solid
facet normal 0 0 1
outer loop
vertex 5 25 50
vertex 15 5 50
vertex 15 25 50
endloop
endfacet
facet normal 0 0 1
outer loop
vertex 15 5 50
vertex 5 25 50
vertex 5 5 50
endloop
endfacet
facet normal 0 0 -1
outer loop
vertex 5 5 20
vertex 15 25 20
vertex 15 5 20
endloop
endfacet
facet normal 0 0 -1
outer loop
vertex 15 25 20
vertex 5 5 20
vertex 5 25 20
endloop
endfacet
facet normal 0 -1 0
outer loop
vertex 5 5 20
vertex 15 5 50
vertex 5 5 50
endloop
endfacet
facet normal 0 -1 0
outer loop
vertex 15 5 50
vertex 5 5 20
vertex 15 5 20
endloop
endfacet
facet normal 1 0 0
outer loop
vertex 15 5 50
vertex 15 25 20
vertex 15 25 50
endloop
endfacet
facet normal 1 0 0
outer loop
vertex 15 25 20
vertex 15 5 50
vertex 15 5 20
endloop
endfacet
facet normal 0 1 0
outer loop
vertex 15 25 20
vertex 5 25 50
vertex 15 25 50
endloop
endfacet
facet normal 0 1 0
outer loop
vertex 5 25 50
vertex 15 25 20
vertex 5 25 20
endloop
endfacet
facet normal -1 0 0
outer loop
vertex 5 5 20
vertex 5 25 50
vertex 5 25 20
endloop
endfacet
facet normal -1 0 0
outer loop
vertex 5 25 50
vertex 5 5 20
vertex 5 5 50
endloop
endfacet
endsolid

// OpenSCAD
result = undef;
$lcs = [0,0,0];

function getLCS() = $lcs;
module item() {
	result = $lcs;
	echo(str("LCS_known: ", result));
	cube([10,20,30]);
}

module translate_ok(v) {
	$lcs = $lcs + v;
	//echo(parent_module());
	echo(str("TRANSLATE: ", v));
	echo(str("LCS: ", $lcs));
	translate(v) children();
}
echo(str("LCS_before: ", $lcs));
translate_ok([10,0,0])
translate_ok([0,10,0])
translate_ok([0,0,10])
translate_ok([-5,-5,10])
item();

echo(str("LCS_after: ", result));

a=1;
$b=4;
echo(a);
module test(a) {
$b=3;
}
test(a);
a=2;
echo($b);

echo(getLCS());
